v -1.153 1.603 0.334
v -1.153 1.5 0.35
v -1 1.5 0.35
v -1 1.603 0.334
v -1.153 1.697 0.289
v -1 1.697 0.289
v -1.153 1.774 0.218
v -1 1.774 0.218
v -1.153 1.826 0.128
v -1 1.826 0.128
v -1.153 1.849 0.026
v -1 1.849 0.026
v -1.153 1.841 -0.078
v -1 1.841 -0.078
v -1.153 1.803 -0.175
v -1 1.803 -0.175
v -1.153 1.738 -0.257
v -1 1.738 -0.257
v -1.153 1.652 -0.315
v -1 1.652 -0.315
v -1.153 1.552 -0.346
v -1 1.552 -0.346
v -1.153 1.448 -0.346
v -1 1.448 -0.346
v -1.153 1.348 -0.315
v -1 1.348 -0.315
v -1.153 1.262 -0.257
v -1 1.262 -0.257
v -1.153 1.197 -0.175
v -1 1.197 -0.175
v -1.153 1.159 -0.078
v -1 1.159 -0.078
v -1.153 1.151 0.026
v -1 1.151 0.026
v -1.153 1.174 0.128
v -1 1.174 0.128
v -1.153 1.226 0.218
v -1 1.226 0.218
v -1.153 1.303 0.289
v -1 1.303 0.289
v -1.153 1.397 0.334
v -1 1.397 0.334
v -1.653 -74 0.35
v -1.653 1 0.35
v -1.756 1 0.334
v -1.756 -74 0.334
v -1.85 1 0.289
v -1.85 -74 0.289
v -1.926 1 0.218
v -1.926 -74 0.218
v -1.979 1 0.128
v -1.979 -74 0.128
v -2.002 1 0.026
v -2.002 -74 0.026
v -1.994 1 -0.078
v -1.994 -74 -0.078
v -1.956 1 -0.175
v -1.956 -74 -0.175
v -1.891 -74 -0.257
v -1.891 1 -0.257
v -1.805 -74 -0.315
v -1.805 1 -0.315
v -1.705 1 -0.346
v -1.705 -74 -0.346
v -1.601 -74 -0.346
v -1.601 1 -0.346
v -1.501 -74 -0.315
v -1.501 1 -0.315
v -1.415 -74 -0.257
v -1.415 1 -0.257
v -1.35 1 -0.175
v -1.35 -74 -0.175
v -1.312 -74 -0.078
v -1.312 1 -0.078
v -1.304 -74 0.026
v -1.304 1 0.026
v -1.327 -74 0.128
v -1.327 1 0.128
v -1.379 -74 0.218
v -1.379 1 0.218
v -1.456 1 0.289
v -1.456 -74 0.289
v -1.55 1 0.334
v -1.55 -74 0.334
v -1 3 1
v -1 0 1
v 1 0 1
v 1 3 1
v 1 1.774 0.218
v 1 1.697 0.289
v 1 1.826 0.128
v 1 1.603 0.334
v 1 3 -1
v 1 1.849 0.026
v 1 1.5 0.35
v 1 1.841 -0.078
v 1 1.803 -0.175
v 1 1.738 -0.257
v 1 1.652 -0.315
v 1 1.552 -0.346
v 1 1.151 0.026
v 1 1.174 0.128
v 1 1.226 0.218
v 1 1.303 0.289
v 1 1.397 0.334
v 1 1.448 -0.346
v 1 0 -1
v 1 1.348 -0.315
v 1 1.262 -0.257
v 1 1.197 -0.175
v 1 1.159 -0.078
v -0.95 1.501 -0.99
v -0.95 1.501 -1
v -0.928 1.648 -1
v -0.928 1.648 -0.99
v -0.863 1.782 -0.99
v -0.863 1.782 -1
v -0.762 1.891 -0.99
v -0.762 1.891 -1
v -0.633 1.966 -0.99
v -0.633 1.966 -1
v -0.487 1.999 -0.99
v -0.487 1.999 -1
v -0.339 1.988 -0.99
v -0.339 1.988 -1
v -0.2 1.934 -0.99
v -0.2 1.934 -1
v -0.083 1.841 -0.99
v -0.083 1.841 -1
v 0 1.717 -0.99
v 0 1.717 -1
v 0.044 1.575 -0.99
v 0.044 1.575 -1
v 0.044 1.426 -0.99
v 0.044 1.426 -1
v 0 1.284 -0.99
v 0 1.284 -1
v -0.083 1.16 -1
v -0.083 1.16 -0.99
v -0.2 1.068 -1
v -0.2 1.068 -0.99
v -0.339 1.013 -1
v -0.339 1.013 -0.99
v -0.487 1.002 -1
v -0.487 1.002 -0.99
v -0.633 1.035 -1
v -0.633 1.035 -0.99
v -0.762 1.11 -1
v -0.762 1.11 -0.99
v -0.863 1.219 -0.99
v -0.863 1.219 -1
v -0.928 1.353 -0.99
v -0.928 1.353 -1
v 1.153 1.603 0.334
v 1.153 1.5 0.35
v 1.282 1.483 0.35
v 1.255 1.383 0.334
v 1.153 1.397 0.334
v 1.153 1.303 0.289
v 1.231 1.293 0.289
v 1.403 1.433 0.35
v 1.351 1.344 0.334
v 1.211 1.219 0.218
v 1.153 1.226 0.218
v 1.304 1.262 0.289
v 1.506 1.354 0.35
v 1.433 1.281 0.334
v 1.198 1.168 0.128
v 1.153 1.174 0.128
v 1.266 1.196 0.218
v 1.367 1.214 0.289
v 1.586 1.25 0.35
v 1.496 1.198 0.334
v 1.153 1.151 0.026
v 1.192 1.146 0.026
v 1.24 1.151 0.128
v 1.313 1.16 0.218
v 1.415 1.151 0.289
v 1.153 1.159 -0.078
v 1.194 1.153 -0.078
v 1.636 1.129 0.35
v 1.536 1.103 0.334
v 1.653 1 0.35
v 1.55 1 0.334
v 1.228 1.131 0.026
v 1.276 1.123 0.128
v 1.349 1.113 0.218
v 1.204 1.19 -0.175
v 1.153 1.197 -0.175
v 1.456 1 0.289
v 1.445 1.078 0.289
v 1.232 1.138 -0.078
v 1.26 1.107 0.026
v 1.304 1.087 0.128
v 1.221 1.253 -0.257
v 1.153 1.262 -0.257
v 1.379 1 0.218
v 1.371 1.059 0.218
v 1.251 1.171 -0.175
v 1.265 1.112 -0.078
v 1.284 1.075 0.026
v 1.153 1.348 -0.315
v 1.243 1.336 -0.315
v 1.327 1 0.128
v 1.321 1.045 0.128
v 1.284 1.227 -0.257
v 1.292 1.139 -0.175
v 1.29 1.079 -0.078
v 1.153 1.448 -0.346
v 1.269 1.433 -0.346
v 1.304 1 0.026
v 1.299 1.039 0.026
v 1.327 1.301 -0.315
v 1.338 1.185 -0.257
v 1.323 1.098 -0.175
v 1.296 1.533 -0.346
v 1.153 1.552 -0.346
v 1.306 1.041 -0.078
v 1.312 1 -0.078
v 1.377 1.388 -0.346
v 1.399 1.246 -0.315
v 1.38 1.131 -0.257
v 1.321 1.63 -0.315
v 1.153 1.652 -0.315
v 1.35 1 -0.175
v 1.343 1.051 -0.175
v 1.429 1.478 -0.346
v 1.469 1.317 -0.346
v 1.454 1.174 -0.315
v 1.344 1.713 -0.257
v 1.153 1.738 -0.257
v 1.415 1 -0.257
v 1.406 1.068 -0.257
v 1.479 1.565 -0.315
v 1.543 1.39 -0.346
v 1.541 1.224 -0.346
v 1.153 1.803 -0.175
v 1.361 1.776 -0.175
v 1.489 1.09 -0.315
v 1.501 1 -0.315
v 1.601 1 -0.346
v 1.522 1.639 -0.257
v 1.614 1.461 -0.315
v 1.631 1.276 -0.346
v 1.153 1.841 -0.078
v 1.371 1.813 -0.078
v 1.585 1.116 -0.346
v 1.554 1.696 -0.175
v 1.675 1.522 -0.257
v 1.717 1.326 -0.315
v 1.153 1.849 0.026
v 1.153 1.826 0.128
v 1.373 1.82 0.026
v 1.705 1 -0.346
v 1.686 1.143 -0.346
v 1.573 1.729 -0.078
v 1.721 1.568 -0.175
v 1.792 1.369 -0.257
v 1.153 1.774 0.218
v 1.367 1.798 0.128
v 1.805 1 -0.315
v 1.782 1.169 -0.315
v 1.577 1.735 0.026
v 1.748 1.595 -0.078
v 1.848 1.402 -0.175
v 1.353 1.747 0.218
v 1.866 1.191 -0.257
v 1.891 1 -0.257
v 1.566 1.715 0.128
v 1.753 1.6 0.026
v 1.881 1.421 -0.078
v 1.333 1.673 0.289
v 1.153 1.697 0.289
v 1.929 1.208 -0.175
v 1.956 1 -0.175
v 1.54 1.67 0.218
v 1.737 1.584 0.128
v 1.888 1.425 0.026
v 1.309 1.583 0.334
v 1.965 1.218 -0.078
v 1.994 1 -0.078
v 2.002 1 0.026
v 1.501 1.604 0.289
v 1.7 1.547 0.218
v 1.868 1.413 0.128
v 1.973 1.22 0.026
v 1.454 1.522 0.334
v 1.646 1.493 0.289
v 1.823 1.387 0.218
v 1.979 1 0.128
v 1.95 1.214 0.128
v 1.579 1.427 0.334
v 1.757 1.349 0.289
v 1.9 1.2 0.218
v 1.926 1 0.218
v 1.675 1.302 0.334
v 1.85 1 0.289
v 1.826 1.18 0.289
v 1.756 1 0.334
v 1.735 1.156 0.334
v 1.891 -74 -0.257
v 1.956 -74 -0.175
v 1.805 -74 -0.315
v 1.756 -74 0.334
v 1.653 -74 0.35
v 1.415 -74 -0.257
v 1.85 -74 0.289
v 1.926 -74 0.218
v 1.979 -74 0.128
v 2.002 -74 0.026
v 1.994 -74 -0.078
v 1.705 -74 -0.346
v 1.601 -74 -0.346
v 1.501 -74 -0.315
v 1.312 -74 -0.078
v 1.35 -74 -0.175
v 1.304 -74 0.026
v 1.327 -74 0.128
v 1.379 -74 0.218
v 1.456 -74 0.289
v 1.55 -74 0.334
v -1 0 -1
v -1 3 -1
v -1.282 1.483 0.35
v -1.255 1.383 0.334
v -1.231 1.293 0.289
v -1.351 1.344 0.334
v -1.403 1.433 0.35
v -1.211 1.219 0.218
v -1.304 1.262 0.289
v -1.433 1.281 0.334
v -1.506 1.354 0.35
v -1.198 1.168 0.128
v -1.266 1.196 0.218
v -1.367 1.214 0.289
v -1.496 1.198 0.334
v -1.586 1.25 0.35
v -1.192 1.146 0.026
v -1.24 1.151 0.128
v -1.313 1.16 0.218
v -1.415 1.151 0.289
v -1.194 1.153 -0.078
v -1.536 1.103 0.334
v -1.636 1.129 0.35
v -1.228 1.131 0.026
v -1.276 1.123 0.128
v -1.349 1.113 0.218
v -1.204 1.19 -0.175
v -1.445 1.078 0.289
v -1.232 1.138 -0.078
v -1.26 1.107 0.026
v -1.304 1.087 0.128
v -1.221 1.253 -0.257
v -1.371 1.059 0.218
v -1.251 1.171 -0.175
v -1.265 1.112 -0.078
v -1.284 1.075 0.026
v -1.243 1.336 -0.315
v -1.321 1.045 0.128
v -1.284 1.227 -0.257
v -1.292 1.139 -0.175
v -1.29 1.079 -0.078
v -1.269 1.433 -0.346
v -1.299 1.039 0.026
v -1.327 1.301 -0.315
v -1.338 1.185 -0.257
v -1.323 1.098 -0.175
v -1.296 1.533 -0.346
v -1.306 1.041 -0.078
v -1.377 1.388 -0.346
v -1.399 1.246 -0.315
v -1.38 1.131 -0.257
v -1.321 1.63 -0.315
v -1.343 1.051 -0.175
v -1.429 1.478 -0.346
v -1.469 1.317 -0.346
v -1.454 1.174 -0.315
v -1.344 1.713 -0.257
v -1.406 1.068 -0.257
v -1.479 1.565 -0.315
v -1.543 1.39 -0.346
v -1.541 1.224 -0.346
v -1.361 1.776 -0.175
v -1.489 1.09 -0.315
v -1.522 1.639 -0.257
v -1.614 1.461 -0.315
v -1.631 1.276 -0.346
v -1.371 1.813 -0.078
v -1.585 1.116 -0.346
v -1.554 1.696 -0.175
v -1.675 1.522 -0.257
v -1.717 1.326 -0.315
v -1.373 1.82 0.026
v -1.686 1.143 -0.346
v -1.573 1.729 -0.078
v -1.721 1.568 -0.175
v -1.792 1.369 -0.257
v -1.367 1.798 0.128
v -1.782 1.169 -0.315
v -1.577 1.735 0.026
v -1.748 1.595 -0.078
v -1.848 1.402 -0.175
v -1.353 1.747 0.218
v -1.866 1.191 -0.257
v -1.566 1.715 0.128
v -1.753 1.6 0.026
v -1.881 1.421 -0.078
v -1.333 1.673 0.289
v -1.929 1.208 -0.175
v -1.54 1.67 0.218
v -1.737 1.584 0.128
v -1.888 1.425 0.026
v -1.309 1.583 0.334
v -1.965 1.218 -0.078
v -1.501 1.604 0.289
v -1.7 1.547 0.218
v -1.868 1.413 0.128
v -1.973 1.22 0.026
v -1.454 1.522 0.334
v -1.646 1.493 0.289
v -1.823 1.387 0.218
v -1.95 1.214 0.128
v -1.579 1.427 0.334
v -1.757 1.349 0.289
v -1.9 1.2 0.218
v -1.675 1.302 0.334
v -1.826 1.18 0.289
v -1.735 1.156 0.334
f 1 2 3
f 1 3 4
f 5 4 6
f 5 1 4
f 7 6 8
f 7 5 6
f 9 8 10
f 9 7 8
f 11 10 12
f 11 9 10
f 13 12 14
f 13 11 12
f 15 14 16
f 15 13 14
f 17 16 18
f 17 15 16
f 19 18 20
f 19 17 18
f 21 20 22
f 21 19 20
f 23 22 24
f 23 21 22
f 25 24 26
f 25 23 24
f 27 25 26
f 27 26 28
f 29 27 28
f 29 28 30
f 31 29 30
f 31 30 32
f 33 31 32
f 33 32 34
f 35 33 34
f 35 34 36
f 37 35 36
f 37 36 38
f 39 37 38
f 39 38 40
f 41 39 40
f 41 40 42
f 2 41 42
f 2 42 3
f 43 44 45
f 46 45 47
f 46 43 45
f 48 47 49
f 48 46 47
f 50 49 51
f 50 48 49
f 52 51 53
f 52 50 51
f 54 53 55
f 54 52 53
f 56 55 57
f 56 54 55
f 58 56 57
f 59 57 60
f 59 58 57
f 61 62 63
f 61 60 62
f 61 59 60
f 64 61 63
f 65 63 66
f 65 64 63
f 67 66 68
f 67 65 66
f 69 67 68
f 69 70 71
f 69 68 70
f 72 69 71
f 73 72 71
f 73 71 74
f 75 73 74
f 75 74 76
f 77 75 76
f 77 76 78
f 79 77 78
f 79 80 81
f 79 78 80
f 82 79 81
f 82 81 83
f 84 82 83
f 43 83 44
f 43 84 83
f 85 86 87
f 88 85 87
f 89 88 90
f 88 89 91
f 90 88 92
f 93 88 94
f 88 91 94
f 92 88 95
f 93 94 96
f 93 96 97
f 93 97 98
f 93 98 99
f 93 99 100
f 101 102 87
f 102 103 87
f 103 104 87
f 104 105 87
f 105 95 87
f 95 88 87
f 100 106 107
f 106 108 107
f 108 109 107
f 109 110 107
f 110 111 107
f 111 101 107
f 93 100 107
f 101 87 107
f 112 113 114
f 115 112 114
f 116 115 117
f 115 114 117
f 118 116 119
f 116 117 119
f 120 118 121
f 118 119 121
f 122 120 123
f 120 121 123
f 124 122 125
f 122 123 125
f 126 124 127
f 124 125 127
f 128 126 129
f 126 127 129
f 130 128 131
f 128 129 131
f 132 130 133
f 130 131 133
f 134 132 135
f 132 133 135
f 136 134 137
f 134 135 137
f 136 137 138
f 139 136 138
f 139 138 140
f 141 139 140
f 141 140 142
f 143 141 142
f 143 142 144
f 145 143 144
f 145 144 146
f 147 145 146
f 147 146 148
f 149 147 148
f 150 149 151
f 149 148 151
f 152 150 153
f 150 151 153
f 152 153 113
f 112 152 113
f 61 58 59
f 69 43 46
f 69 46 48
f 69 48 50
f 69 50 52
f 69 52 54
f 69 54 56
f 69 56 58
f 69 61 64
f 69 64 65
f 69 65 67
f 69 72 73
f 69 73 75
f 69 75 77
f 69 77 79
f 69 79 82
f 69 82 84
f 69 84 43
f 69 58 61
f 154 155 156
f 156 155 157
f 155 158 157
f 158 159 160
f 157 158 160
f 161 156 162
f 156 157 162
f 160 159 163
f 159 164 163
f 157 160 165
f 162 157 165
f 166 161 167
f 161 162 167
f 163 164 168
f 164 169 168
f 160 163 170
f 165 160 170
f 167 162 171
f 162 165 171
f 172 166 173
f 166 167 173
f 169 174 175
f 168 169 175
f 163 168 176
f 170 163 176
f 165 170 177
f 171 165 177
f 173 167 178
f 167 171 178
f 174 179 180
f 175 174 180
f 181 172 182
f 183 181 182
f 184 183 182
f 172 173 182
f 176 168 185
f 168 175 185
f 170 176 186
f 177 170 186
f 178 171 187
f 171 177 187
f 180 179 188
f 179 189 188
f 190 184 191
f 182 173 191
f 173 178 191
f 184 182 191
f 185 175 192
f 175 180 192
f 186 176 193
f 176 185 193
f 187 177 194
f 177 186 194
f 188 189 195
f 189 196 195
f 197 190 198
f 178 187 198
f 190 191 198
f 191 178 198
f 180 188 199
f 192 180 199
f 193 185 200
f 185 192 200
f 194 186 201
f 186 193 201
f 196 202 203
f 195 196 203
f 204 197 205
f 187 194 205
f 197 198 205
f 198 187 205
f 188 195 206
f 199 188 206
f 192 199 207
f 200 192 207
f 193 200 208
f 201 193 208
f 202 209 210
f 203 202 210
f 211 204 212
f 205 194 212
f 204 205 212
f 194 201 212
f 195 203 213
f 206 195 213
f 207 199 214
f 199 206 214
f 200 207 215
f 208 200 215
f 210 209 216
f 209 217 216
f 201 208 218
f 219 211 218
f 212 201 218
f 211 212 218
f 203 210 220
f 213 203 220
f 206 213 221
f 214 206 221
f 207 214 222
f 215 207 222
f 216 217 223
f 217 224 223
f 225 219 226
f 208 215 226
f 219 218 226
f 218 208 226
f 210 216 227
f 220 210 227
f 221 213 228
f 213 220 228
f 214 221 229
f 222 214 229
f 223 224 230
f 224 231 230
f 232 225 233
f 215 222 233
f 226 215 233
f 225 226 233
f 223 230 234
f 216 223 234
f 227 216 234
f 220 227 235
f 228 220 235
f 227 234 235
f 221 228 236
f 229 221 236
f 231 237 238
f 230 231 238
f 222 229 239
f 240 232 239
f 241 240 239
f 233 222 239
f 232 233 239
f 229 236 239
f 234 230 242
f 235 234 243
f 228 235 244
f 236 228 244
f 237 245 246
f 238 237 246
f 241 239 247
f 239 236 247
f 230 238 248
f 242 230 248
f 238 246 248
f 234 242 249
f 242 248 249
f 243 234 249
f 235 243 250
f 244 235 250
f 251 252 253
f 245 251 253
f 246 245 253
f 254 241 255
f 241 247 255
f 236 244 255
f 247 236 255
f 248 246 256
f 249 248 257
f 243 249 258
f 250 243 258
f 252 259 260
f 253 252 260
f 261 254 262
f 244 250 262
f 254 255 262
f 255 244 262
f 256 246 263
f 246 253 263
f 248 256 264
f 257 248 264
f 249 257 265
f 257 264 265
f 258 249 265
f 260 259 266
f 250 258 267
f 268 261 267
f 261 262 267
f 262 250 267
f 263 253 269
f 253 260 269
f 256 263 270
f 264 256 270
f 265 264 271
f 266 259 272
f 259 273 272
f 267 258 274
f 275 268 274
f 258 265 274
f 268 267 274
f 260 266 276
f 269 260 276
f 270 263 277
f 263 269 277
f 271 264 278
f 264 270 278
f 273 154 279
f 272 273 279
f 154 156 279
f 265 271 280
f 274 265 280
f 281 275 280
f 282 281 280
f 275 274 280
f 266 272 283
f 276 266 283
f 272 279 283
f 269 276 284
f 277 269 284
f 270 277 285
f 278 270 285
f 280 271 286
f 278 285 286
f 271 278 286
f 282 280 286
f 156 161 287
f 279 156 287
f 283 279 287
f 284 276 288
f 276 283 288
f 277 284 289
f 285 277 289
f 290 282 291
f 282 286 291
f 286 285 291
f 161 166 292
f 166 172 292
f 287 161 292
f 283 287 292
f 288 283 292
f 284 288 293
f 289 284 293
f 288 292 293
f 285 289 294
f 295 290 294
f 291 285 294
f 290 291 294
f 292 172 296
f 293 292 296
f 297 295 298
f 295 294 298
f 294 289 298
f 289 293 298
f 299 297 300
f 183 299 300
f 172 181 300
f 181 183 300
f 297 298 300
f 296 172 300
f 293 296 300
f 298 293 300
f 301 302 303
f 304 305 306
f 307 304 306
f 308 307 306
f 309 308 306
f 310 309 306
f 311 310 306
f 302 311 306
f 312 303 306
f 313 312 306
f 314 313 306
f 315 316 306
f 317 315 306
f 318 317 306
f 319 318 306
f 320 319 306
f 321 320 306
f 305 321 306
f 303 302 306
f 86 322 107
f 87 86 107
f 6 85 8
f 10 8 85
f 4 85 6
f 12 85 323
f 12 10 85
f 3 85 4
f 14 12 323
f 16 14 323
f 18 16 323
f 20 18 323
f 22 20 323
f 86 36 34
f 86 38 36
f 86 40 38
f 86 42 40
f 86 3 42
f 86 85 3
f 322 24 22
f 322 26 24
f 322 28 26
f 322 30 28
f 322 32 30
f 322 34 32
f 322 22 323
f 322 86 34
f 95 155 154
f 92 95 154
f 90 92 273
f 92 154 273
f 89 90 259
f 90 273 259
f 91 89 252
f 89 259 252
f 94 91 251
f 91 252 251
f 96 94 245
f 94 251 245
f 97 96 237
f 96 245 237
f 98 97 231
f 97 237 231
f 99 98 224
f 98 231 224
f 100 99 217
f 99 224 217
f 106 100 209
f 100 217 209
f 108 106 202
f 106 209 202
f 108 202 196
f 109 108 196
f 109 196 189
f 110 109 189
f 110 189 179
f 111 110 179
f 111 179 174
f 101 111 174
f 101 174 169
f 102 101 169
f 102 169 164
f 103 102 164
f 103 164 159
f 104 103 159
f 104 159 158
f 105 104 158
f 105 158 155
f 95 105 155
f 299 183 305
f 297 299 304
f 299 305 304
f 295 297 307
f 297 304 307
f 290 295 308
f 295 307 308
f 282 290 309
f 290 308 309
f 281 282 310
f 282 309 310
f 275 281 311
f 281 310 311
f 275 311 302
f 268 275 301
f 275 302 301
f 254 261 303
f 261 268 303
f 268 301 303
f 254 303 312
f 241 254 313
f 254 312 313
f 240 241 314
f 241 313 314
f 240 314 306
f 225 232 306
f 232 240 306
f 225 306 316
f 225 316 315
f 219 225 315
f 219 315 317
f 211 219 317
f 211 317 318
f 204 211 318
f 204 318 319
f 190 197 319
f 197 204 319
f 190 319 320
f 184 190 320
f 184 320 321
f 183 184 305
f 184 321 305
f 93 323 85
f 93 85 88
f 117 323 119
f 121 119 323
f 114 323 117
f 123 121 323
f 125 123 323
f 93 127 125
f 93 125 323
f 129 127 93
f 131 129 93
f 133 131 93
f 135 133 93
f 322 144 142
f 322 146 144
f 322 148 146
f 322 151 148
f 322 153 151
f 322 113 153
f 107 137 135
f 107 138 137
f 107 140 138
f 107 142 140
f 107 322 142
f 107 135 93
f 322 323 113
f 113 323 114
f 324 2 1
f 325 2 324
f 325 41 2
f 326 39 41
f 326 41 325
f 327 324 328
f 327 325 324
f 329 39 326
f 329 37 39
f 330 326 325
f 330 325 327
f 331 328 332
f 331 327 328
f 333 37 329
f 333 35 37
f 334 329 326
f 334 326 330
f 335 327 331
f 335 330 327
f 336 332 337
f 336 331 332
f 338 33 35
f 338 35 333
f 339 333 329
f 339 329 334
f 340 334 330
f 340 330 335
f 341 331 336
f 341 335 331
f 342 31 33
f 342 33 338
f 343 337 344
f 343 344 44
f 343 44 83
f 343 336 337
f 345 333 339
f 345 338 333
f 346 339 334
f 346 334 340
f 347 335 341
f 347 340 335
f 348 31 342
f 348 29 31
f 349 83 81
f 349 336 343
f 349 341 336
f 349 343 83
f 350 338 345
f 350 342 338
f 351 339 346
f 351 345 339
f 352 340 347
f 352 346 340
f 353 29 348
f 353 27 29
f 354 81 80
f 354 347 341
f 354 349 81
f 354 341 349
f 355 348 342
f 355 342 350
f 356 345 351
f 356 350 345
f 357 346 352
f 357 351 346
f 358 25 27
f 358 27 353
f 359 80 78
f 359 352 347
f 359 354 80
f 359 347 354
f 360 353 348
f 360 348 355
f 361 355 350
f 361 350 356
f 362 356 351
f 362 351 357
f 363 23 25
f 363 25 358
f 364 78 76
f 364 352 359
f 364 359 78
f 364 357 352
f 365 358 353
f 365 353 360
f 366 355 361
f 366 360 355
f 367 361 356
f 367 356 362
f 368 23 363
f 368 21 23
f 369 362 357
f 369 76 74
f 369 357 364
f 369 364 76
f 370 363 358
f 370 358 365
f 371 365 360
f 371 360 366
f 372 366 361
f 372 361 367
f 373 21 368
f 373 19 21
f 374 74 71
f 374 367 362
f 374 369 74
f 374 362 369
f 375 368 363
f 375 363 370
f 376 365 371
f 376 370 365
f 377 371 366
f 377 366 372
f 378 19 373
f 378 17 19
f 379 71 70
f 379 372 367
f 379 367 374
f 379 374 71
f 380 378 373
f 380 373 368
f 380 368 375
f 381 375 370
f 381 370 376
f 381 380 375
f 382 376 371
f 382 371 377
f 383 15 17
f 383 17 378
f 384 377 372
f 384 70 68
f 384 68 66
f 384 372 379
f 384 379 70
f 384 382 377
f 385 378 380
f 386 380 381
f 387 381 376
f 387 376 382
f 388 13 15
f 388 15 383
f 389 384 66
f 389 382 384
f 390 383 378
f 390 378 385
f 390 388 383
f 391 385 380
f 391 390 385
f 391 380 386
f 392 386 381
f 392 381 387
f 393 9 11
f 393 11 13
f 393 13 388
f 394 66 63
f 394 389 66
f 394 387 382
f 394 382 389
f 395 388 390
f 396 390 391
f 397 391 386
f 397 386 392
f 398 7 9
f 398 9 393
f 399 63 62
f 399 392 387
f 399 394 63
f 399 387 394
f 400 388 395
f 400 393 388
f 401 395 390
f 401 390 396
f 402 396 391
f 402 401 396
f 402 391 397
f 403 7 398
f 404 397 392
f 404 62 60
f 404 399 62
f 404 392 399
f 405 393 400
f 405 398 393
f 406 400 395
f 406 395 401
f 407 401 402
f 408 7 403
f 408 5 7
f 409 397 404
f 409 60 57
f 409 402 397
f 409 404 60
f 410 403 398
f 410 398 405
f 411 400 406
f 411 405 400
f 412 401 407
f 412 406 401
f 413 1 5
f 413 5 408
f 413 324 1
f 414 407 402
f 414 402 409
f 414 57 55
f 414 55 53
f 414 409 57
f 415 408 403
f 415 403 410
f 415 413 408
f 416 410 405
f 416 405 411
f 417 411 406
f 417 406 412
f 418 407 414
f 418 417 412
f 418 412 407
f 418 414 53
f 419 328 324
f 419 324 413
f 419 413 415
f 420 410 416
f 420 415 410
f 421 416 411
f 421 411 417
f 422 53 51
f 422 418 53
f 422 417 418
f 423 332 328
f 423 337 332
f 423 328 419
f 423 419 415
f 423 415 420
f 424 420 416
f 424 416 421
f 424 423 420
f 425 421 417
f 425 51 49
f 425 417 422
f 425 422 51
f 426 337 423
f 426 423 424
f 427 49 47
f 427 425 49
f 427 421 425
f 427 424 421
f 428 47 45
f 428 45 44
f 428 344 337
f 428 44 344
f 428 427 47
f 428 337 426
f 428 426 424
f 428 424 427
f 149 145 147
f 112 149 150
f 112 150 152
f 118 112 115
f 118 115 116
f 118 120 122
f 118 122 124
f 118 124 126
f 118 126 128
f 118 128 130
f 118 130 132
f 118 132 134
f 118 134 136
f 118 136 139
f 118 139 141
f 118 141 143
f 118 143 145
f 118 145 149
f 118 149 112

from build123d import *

# Parameters (mm, degrees)
SKETCH1_W           = 2
SKETCH1_H           = 2
BOSS_EXTRUDE1_DEPTH = 3
SKETCH2_R           = 0.5
CUT_EXTRUDE1_DEPTH  = 0.01
SKETCH3_R           = 0.35


with BuildPart() as part:
    # Sketch1 → Boss-Extrude1 (new body)
    with BuildSketch(Plane(origin=(0, 0, 0), x_dir=(1, 0, 0), z_dir=(0, 1, 0))):
        Rectangle(SKETCH1_W, SKETCH1_H)
    extrude(amount=BOSS_EXTRUDE1_DEPTH)

    # Sketch2 → Cut-Extrude1 (cut)
    with BuildSketch(Plane(origin=(0, 0, -1), x_dir=(-1, 0, 0), z_dir=(0, 0, -1))):
        with Locations((0.45, 1.500545884)):
            Circle(SKETCH2_R)
    extrude(amount=-CUT_EXTRUDE1_DEPTH, mode=Mode.SUBTRACT)

    # Sweep1: sweep along a path in Sketch8
    with BuildLine(Plane(origin=(-1, 1.5, 0), x_dir=(1, 0, 0), z_dir=(0, 0, 1))) as sweep1_path:
        Line((0, 0), (-0.152776169, 0))
        ThreePointArc((-0.152776169, 0), (-0.50632956, -0.146446609), (-0.652776169, -0.5))
        Line((-0.652776169, -0.5), (-0.652776169, -75.5))
    # Sketch3 → Sweep1 (sweep)
    with BuildSketch(Plane.ZY.offset(1)):
        with Locations((0, 1.5)):
            Circle(SKETCH3_R)
    sweep1 = sweep(path=sweep1_path.line)

    # Mirror1: Sweep1 across plane
    add(sweep1.mirror(Plane(origin=(0, 0, 0), x_dir=(0, 0, 1), z_dir=(1, 0, 0))))


solid = part.part
